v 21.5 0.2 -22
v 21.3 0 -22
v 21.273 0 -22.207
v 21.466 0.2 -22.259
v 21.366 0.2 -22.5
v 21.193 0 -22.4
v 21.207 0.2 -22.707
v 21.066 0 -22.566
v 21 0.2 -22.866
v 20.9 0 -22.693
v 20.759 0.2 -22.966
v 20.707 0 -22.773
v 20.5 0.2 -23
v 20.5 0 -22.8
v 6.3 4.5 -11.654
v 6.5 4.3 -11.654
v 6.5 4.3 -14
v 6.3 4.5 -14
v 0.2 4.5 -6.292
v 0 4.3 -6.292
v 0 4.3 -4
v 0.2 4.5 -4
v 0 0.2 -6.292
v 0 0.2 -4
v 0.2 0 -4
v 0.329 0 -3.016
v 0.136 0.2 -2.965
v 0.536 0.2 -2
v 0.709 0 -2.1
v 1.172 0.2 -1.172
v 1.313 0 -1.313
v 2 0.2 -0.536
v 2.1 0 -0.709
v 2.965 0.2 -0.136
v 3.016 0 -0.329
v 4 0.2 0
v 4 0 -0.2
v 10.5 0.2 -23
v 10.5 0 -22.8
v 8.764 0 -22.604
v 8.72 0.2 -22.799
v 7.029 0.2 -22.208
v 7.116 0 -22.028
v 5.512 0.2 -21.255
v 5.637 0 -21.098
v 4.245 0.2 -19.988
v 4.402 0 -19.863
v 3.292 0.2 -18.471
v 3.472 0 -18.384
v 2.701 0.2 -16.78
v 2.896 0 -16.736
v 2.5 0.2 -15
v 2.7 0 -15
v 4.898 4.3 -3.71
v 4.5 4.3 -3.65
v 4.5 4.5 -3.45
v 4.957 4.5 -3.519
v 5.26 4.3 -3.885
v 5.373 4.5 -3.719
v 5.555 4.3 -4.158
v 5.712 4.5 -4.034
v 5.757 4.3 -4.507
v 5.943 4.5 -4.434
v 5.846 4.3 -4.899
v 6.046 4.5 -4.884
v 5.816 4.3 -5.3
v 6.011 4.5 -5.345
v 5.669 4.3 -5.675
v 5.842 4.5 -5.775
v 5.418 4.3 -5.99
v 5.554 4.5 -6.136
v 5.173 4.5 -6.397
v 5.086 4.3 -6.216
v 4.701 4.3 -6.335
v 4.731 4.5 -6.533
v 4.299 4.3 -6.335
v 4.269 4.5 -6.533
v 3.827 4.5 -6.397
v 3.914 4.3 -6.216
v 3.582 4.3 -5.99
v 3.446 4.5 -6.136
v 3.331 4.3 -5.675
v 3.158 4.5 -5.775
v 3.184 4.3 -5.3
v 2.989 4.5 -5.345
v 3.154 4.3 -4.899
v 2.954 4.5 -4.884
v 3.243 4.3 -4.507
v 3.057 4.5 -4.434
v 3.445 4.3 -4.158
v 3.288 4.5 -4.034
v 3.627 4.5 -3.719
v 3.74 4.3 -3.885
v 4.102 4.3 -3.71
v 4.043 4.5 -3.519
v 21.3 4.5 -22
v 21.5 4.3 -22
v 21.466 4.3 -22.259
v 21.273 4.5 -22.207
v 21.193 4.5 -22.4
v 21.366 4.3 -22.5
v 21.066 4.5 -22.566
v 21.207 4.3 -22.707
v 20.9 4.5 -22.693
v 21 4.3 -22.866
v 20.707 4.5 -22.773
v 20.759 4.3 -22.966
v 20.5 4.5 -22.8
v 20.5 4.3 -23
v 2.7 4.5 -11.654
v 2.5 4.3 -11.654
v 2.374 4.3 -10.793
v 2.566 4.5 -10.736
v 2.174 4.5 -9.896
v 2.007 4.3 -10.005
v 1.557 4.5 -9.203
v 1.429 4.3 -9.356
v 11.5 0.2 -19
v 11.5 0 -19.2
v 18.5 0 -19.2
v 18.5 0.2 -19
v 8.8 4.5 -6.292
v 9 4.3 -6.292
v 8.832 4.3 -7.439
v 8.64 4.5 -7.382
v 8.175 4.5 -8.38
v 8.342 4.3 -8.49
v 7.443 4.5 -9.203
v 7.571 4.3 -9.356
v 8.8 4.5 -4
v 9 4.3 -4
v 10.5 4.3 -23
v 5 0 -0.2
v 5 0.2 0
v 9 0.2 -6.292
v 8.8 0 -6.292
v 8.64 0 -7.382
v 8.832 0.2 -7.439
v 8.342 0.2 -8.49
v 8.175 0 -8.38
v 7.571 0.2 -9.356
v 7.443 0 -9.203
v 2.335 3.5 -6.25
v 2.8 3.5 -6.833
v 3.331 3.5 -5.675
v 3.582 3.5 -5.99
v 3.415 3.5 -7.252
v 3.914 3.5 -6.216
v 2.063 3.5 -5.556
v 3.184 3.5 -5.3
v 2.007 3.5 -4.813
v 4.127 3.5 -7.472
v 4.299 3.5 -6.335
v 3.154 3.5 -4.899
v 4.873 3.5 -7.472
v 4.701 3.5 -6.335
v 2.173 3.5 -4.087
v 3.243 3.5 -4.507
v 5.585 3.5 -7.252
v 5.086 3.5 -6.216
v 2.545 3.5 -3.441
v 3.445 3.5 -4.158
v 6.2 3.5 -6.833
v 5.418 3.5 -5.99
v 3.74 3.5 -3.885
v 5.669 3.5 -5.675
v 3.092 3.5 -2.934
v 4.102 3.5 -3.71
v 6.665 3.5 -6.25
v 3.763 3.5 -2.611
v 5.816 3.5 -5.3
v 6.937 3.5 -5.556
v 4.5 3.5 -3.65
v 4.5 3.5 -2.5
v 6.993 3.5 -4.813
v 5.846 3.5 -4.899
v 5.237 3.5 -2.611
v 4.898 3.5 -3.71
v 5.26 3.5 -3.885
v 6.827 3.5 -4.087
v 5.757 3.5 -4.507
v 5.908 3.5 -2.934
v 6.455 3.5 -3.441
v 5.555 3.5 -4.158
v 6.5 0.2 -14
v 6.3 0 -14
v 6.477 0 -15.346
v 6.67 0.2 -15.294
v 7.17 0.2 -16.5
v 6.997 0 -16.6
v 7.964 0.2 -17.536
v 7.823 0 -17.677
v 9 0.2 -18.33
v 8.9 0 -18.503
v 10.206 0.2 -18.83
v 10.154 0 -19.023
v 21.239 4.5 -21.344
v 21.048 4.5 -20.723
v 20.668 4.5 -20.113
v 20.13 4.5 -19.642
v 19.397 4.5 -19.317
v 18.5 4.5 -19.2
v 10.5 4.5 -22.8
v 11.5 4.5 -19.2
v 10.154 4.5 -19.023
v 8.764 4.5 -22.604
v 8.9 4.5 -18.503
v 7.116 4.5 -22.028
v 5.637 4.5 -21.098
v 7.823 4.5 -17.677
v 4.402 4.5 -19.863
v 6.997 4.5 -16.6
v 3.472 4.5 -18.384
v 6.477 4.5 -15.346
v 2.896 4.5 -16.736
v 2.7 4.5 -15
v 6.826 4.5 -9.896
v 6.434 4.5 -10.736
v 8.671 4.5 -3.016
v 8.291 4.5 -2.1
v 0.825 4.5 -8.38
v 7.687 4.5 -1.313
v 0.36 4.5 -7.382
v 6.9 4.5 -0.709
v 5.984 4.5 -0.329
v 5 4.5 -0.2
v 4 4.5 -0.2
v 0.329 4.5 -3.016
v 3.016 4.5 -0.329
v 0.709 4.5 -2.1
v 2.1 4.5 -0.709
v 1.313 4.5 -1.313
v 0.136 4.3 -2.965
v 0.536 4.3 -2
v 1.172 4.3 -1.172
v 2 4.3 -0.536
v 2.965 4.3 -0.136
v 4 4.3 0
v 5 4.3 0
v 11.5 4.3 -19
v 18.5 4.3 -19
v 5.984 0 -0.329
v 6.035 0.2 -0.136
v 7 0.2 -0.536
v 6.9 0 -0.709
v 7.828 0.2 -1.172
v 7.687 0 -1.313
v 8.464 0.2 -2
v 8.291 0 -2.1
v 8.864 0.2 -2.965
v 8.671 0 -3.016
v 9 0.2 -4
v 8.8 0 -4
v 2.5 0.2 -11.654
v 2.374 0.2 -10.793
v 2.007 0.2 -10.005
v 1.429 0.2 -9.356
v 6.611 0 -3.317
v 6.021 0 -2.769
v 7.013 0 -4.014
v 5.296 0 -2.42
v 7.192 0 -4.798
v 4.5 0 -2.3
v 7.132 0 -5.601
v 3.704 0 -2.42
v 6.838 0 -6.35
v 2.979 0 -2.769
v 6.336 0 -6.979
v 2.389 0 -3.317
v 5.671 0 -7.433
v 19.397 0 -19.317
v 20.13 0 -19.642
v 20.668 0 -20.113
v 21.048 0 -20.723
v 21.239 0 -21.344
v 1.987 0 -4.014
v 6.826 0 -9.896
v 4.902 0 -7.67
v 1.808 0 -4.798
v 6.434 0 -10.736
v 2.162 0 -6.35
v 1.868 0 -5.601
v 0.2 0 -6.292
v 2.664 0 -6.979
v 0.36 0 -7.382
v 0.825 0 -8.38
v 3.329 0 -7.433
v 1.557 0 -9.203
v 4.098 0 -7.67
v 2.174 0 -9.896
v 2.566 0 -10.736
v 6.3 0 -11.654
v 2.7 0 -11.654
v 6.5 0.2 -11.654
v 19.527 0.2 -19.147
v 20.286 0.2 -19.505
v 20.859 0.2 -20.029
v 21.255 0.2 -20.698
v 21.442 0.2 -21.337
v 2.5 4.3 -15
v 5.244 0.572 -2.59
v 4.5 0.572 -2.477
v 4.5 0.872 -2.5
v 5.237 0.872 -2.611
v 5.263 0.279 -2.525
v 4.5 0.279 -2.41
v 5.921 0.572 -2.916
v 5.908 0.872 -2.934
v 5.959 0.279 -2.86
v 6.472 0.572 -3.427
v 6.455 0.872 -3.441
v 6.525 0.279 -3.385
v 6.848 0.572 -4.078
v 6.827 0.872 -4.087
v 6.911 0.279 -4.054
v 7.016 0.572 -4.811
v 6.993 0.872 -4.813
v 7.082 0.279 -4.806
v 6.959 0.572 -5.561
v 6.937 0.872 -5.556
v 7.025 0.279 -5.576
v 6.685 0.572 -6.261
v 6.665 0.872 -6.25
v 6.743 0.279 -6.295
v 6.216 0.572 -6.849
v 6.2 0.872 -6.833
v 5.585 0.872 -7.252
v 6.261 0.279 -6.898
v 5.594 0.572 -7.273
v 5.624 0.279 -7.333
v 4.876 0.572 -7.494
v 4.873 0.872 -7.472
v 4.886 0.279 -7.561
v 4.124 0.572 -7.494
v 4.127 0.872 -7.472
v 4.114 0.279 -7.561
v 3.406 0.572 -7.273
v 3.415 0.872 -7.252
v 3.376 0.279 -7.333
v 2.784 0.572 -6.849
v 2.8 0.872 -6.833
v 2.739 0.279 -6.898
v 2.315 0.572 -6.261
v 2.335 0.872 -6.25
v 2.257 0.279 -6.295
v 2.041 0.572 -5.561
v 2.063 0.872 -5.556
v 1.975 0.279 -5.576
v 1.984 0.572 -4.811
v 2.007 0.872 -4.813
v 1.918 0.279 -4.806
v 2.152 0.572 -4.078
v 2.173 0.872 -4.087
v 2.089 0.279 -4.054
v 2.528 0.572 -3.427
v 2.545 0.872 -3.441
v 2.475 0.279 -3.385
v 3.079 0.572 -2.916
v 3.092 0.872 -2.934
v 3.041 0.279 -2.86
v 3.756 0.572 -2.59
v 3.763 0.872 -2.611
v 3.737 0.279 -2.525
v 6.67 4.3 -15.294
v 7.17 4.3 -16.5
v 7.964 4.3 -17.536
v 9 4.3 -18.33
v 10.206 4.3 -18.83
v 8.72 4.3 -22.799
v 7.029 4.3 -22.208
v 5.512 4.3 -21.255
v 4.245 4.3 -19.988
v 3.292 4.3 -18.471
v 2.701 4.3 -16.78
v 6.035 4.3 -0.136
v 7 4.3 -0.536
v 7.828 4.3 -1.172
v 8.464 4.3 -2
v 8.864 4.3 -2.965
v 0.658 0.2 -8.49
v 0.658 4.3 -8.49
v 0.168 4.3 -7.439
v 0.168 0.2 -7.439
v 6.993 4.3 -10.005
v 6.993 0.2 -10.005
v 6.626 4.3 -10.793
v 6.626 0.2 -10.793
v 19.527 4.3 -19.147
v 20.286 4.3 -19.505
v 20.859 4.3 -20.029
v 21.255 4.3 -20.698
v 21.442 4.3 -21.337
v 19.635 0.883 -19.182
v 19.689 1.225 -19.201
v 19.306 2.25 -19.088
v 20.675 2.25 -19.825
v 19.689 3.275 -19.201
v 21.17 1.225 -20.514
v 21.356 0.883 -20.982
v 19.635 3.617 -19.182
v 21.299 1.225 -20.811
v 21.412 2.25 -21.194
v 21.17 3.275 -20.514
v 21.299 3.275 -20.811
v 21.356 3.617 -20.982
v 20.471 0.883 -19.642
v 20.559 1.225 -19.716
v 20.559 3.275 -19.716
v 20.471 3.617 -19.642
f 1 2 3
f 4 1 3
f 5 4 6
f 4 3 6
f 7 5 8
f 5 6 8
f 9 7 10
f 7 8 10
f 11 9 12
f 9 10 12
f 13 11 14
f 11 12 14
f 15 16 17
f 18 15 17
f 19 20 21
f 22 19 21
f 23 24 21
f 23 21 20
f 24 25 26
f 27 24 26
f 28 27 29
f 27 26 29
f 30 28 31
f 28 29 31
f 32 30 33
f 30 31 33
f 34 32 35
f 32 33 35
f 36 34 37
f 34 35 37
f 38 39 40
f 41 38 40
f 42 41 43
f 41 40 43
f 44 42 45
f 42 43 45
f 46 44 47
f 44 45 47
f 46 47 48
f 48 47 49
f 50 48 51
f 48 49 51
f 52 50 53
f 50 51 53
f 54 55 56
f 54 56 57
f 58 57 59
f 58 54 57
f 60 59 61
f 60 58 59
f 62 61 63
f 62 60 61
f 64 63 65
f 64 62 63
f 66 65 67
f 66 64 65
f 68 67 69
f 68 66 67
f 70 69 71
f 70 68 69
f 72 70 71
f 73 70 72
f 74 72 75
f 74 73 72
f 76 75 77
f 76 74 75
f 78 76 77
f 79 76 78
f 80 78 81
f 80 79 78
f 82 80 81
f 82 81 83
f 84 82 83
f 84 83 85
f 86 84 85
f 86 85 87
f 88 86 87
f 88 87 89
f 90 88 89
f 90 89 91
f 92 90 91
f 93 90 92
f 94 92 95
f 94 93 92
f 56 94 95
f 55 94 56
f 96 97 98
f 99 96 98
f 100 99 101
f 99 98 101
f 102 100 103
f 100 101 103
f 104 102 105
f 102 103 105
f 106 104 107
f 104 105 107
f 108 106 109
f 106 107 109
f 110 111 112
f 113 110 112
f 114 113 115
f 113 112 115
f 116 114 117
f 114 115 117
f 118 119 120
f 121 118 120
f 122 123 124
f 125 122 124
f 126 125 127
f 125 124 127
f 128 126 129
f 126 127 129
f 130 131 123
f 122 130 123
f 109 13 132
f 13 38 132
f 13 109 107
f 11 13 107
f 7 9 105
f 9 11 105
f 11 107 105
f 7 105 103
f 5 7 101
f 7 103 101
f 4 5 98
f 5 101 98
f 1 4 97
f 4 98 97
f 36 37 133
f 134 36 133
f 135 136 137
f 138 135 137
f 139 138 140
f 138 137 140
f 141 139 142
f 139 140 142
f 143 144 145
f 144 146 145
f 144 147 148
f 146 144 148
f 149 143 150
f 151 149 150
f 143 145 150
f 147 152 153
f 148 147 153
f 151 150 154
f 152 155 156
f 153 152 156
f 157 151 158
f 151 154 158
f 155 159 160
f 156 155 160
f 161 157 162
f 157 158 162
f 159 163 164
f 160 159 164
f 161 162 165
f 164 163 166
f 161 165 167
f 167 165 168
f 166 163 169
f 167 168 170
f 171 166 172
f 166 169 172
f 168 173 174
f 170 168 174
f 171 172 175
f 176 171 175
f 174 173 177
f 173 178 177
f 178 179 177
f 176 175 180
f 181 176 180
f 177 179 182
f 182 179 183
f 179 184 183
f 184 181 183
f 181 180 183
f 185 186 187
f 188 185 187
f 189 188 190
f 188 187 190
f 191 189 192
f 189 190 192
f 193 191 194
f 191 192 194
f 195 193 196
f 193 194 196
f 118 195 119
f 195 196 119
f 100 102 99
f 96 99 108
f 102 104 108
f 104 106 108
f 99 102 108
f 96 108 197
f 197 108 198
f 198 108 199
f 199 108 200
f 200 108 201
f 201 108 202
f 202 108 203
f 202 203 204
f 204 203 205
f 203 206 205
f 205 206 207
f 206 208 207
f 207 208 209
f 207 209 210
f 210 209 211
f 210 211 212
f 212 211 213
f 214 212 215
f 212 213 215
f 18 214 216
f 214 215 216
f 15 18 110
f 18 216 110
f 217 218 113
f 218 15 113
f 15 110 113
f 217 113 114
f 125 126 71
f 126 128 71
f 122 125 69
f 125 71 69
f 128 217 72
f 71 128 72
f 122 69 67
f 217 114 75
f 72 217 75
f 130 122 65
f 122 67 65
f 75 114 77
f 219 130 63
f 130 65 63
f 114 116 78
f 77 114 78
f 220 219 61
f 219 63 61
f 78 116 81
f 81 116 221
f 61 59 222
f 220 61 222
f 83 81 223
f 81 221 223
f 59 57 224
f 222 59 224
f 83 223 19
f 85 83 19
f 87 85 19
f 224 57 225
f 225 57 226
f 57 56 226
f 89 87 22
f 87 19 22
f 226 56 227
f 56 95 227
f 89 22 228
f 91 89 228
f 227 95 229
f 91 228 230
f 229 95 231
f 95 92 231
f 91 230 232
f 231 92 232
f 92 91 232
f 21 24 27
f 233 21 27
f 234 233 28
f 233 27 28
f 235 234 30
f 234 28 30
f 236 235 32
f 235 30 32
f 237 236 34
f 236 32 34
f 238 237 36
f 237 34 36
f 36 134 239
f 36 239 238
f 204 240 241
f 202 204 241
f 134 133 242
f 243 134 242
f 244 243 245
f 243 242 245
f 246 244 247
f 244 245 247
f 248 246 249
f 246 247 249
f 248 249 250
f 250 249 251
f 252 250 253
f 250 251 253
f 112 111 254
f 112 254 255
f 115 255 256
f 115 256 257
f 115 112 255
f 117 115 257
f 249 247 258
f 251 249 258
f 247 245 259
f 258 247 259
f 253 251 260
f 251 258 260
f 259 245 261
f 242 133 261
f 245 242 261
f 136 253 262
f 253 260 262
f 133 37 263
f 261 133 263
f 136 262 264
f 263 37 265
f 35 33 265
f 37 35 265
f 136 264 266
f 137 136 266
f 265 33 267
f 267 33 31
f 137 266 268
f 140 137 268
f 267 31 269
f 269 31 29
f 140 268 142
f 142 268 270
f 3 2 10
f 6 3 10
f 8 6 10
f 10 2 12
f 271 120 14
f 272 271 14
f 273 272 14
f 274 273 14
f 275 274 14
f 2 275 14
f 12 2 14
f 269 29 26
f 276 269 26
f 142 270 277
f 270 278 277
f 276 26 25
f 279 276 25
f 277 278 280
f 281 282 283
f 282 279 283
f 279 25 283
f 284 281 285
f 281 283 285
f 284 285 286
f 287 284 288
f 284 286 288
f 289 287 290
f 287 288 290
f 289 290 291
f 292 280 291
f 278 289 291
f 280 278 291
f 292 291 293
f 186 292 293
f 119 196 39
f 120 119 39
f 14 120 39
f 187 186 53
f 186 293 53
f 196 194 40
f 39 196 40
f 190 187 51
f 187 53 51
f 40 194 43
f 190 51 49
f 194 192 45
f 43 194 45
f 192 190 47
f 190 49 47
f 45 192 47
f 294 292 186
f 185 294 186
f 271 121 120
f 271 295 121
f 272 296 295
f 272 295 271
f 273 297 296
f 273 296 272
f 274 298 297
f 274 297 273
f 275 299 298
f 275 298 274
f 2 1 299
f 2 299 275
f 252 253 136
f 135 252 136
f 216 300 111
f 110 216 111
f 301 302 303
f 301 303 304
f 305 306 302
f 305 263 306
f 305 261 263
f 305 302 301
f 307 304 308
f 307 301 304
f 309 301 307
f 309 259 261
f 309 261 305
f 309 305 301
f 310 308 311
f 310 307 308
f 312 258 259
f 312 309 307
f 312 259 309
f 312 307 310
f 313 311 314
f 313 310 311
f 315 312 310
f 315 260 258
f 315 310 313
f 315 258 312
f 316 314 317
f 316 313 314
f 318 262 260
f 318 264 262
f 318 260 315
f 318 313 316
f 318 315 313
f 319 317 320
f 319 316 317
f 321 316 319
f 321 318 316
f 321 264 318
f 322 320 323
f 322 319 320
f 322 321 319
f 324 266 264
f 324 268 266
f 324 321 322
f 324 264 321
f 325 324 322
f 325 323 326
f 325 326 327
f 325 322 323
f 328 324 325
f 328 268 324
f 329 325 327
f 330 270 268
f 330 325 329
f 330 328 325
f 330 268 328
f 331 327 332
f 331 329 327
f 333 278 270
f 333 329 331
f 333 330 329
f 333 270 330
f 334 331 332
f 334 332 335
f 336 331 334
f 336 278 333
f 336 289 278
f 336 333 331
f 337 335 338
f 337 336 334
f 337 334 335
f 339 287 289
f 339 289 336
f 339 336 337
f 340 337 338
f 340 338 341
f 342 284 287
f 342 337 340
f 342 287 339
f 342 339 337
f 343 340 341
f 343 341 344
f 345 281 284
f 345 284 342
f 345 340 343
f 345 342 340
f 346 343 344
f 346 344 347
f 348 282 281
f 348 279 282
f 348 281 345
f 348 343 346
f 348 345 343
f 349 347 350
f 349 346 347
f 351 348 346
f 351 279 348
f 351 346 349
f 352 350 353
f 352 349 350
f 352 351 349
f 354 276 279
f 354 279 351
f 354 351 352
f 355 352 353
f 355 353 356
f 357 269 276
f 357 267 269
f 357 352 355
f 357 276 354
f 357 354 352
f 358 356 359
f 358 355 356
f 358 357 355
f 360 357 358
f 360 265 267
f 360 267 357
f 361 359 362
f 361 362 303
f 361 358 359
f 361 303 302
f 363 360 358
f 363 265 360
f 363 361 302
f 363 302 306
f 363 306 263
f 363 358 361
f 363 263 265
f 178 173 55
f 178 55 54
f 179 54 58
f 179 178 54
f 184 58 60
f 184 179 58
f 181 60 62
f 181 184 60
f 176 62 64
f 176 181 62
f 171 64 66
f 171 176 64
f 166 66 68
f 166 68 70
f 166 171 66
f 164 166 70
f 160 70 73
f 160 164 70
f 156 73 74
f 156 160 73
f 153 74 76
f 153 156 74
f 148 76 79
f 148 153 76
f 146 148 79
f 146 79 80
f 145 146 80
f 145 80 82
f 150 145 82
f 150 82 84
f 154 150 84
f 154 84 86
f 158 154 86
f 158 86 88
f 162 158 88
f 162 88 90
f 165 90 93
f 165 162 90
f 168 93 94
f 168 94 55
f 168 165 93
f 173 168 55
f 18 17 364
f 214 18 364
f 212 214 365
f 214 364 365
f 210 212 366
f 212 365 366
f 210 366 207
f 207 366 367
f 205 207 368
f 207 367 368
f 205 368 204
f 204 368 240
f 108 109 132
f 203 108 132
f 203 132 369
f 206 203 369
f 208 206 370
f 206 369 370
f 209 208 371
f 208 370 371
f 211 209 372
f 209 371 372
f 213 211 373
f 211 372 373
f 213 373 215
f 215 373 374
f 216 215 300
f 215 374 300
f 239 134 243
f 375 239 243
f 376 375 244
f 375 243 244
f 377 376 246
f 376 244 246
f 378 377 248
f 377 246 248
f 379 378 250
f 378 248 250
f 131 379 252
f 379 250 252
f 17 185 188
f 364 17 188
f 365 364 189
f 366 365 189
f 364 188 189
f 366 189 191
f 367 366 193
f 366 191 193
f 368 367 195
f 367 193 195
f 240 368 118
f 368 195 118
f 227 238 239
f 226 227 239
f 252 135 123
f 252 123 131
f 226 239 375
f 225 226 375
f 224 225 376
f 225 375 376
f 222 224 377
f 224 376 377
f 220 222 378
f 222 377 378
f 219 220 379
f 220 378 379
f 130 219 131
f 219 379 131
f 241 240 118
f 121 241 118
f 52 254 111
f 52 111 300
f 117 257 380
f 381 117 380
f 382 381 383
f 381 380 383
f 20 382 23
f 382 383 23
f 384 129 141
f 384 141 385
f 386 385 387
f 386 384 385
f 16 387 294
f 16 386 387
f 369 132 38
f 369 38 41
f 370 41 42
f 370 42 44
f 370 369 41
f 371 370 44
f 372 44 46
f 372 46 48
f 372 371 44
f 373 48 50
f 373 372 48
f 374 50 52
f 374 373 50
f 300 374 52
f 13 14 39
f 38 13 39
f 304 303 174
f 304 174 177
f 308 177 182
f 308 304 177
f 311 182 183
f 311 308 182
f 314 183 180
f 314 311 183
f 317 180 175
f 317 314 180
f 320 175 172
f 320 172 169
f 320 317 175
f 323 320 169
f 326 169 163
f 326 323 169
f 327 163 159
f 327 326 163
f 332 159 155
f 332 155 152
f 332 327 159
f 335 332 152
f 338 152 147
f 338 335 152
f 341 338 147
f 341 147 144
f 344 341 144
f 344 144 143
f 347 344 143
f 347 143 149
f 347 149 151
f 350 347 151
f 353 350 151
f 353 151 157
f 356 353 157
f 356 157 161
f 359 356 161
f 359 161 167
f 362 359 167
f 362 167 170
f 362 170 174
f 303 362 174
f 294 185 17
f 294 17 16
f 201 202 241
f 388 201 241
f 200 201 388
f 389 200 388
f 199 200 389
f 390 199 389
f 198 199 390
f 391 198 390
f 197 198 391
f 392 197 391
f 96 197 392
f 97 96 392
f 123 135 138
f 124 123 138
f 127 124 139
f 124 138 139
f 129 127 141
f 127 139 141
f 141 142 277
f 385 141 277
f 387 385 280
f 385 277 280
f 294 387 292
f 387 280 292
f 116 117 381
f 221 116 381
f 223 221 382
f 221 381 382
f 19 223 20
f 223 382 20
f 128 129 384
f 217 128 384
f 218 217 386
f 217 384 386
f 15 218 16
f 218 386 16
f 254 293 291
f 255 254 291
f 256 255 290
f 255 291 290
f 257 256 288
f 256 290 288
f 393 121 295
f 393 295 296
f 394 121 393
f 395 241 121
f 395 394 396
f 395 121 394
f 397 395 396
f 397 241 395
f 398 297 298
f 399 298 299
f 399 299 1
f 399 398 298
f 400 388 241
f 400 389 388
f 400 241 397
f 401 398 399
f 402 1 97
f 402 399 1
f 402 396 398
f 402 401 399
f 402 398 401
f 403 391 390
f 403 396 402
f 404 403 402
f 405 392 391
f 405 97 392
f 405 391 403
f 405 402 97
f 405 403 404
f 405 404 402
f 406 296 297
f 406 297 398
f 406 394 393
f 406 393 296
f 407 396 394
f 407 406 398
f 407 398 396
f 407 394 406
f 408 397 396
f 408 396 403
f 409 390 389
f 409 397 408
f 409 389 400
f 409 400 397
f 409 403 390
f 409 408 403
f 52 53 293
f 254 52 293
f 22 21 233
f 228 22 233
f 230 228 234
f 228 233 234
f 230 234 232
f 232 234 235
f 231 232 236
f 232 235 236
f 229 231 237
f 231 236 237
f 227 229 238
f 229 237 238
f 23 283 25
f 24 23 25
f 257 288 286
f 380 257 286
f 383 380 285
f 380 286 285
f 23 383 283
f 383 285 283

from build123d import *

# Parameters (mm, degrees)
SKETCH_1_R      = 2.4999999999999996
EXTRUDE_1_DEPTH = 4.5
EXTRUDE_START   = -1
SKETCH_3_R      = 2.4999999999999996
SKETCH_3_R_2    = 1.3499999999999994
EXTRUDE_3_DEPTH = 1
EXTRUDE_4_DEPTH = 15
FILLET_1_SIZE   = 3
FILLET_3_R      = 5
FILLET_4_R      = 8
FILLET_5_R      = 4
FILLET_6_R      = 3
FILLET_7_R      = 1
CHAMFER_3_SIZE  = 0.2
FILLET_8_R      = 2


# Some blends are built 0.0001 mm under size
with BuildPart() as part:
    # 草图1 → 凸台-拉伸1 (new body)
    with BuildSketch(Plane(origin=(0, 0, 0), x_dir=(1, 0, 0), z_dir=(0, 1, 0))):
        Polygon((6.500000000000001, 10), (9, 10), (9, 0), (0, 0), (0, 10), (2.499999999999998, 10), (2.500000000000002, 23), (6.500000000000003, 23), align=None)
        with Locations(Location((4.5, 5.000000000000001, 0), (0, 0, 270))):
            Circle(SKETCH_1_R, mode=Mode.SUBTRACT)
    extrude(amount=EXTRUDE_1_DEPTH)

    # 草图3 → 凸台-拉伸3 (add)
    with BuildSketch(Plane(origin=(0, 4.5, 0), x_dir=(1, 0, 0), z_dir=(0, 1, 0)).offset(EXTRUDE_START)):
        with Locations(Location((4.5, 5.000000000000001, 0), (0, 0, 270))):
            Circle(SKETCH_3_R)
        with Locations(Location((4.5, 5.000000000000001, 0), (0, 0, 270))):
            Circle(SKETCH_3_R_2, mode=Mode.SUBTRACT)
    extrude(amount=EXTRUDE_3_DEPTH)

    # 草图4 → 凸台-拉伸4 (add)
    with BuildSketch(Plane(origin=(6.499999999999999, 0, 8.7e-16), x_dir=(-2.9e-16, 0, -1), z_dir=(1, 0, -2.9e-16))):
        Polygon((23, 4.5), (19, 4.499999999999999), (19, 0), (23, 1.2e-16), align=None)
    extrude(amount=EXTRUDE_4_DEPTH)

    # 圆角1
    # a fillet whose section is not a circle: 3 mm, written as the material it takes off along each edge
    with BuildSketch(Plane(origin=(21.499999999999993, 12, -19.000000000000004), x_dir=(-1, 0, 0), z_dir=(0, -1, 0))) as fillet_1_piece_1:
        with BuildLine():
            Bezier((FILLET_1_SIZE, 0), (0, 0), (0, FILLET_1_SIZE), weights=[1, 0.818181818181818, 1])
            Line((0, FILLET_1_SIZE), (0, 0))
            Line((0, 0), (FILLET_1_SIZE, 0))
        make_face()
    extrude(amount=19.5, mode=Mode.SUBTRACT)

    # 圆角3
    fillet_3_edges = [part.edges().sort_by_distance(p)[0] for p in [
        (6.499999999999994, 2.2499999999999996, -19),
    ]]
    fillet(fillet_3_edges, radius=FILLET_3_R)

    # 圆角4
    fillet_4_edges = [part.edges().sort_by_distance(p)[0] for p in [
        (2.500000000000002, 2.25, -23),
    ]]
    fillet(fillet_4_edges, radius=FILLET_4_R)

    # 圆角5
    # the kernel refuses this fillet: 4 mm, written as the material it takes off along each edge
    with BuildSketch(Plane(origin=(9, -10, 0), x_dir=(-1, 0, 0), z_dir=(0, 1, 0))) as fillet_5_piece_1:
        with BuildLine():
            CenterArc((FILLET_5_R, -FILLET_5_R), FILLET_5_R, 90, 90)
            Line((0, -FILLET_5_R), (-FILLET_5_R * 0.02, -FILLET_5_R))
            Line((-FILLET_5_R * 0.02, -FILLET_5_R), (-FILLET_5_R * 0.02, FILLET_5_R * 0.02))
            Line((-FILLET_5_R * 0.02, FILLET_5_R * 0.02), (FILLET_5_R, FILLET_5_R * 0.02))
            Line((FILLET_5_R, FILLET_5_R * 0.02), (FILLET_5_R, 0))
        make_face()
    extrude(amount=24.5, mode=Mode.SUBTRACT)
    with BuildSketch(Plane(origin=(0, -10, 0), x_dir=(0, 0, -1), z_dir=(0, 1, 0))) as fillet_5_piece_2:
        with BuildLine():
            CenterArc((FILLET_5_R, -FILLET_5_R), FILLET_5_R, 90, 90)
            Line((-4.4e-16, -FILLET_5_R), (-FILLET_5_R * 0.02, -FILLET_5_R))
            Line((-FILLET_5_R * 0.02, -FILLET_5_R), (-FILLET_5_R * 0.02, FILLET_5_R * 0.02))
            Line((-FILLET_5_R * 0.02, FILLET_5_R * 0.02), (FILLET_5_R, FILLET_5_R * 0.02))
            Line((FILLET_5_R, FILLET_5_R * 0.02), (FILLET_5_R, 0))
        make_face()
    extrude(amount=24.5, mode=Mode.SUBTRACT)
    with BuildSketch(Plane(origin=(9, -9.27024810886958, -10), x_dir=(0, 0, 1), z_dir=(0, 1, 0))) as fillet_5_piece_3:
        with BuildLine():
            CenterArc((3.7080992435478315, -4), FILLET_5_R, 90, 67.97568716295783)
            Line((0, -2.499999999999999), (-0.07416198487095649, -2.469999999999999))
            ThreePointArc((-0.07416198487095649, -2.469999999999999), (-0.08000000000000007, -1.25), (-0.08000000000000007, 0))
            Line((-0.08000000000000007, 0), (0, 0.08000000000000007))
            Line((0, 0.08000000000000007), (3.7080992435478315, 0.08000000000000007))
            Line((3.7080992435478315, 0.08000000000000007), (3.7080992435478315, 0))
        make_face()
    extrude(amount=23.04049621773916, mode=Mode.SUBTRACT)
    with BuildSketch(Plane(origin=(0, -9.270248108869577, -10), x_dir=(1, 0, 0), z_dir=(0, 1, 0))) as fillet_5_piece_4:
        with BuildLine():
            CenterArc((4, -3.7080992435478306), FILLET_5_R, 112.0243128370422, 67.9756871629578)
            Line((0, -3.7080992435478306), (-0.08, -3.7080992435478306))
            Line((-0.08, -3.7080992435478306), (-0.08, 0))
            Line((-0.08, 0), (0, 0.08000000000000007))
            ThreePointArc((0, 0.08000000000000007), (1.249999999999999, 0.08000000000000007), (2.4699999999999975, 0.07416198487095649))
            Line((2.4699999999999975, 0.07416198487095649), (2.499999999999998, 0))
        make_face()
    extrude(amount=23.040496217739154, mode=Mode.SUBTRACT)

    # 圆角6
    fillet_6_edges = [part.edges().sort_by_distance(p)[0] for p in [
        (2.499999999999998, 2.25, -10),
        (6.500000000000001, 2.25, -10),
    ]]
    fillet(fillet_6_edges, radius=FILLET_6_R)

    # 圆角7
    fillet_7_edges = [part.edges().sort_by_distance(p)[0] for p in [
        (21.499999999999993, 2.25, -23.000000000000004),
    ]]
    fillet(fillet_7_edges, radius=FILLET_7_R - 0.0001)  # a hair under: the kernel refuses the full size

    # 倒角3
    chamfer_3_edges = [part.edges().sort_by_distance(p)[0] for p in [
        (4.5, 4.5, -6.3500000000000005),
        (15, 4.499999999999999, -19.000000000000004),
        (7.964466094067261, 4.5, -17.535533905932738),
        (7.964466094067261, 0, -17.535533905932738),
        (6.500000000000001, 4.5, -12.826901701916901),
        (6.500000000000001, 0, -12.826901701916901),
        (6.781019098475102, 4.5, -10.386072021741027),
        (6.781019098475102, 0, -10.386072021741027),
        (8.625307868699863, 0, -7.982209265909031),
        (8.625307868699863, 4.5, -7.982209265909031),
        (9, 4.5, -5.145950378226),
        (9, 0, -5.145950378226),
        (7.828427124746191, 4.5, -1.1715728752538102),
        (7.828427124746191, 0, -1.1715728752538102),
        (4.5, 0, 0),
        (4.5, 4.5, 0),
        (1.1715728752538102, 4.5, -1.1715728752538093),
        (1.1715728752538102, 0, -1.1715728752538093),
        (0, 0, -5.145950378226),
        (0, 4.5, -5.145950378226),
        (0.37469213130013657, 4.5, -7.982209265909032),
        (0.37469213130013657, 0, -7.982209265909032),
        (2.2189809015248967, 4.5, -10.386072021741029),
        (2.2189809015248967, 0, -10.386072021741029),
        (2.499999999999999, 0, -13.3269017019169),
        (2.499999999999999, 4.5, -13.3269017019169),
        (4.84314575050762, 4.5, -20.65685424949238),
        (4.84314575050762, 0, -20.65685424949238),
        (15.500049999999996, 4.5, -23.000000000000004),
        (15.500049999999996, 8e-17, -23.000000000000004),
        (21.207136070508422, 0, -22.70713607050843),
        (21.207136070508422, 4.5, -22.70713607050843),
        (20.675000000000082, 4.5, -19.82499999999992),
        (20.675000000000082, 0, -19.82499999999992),
        (4.500000000000001, 0, -7.5),
        (15, 0, -19.000000000000004),
    ]]
    chamfer(chamfer_3_edges, length=CHAMFER_3_SIZE)

    # 圆角8
    # the kernel refuses this fillet: 2 mm, written as the material it takes off along each edge
    with BuildSketch(Plane(origin=(4.5, 0.2, -5.000000000000001), x_dir=(-3.6e-16, 0, 1), z_dir=(-1, 0, -3.6e-16))) as fillet_8_piece_1:
        with BuildLine():
            CenterArc((4.499999999999999, 0.6717797887081369), FILLET_8_R, 180, 25.841932763167165)
            Line((2.499999999999999, 0.6717797887081369), (2.459999999999999, 0.6717797887081369))
            Line((2.459999999999999, 0.6717797887081369), (2.459999999999999, 0))
            Line((2.459999999999999, 0), (2.471715728752537, -0.02828427124746191))
            ThreePointArc((2.471715728752537, -0.02828427124746191), (2.5717157287525376, -0.1282842712474619), (2.6640000000000006, -0.21743559577416274))
            Line((2.6640000000000006, -0.21743559577416274), (2.7, -0.2))
        make_face()
    revolve(axis=Axis((4.5, 0.2, -5.000000000000001), (0, 1, 0)), mode=Mode.SUBTRACT)


solid = part.part
